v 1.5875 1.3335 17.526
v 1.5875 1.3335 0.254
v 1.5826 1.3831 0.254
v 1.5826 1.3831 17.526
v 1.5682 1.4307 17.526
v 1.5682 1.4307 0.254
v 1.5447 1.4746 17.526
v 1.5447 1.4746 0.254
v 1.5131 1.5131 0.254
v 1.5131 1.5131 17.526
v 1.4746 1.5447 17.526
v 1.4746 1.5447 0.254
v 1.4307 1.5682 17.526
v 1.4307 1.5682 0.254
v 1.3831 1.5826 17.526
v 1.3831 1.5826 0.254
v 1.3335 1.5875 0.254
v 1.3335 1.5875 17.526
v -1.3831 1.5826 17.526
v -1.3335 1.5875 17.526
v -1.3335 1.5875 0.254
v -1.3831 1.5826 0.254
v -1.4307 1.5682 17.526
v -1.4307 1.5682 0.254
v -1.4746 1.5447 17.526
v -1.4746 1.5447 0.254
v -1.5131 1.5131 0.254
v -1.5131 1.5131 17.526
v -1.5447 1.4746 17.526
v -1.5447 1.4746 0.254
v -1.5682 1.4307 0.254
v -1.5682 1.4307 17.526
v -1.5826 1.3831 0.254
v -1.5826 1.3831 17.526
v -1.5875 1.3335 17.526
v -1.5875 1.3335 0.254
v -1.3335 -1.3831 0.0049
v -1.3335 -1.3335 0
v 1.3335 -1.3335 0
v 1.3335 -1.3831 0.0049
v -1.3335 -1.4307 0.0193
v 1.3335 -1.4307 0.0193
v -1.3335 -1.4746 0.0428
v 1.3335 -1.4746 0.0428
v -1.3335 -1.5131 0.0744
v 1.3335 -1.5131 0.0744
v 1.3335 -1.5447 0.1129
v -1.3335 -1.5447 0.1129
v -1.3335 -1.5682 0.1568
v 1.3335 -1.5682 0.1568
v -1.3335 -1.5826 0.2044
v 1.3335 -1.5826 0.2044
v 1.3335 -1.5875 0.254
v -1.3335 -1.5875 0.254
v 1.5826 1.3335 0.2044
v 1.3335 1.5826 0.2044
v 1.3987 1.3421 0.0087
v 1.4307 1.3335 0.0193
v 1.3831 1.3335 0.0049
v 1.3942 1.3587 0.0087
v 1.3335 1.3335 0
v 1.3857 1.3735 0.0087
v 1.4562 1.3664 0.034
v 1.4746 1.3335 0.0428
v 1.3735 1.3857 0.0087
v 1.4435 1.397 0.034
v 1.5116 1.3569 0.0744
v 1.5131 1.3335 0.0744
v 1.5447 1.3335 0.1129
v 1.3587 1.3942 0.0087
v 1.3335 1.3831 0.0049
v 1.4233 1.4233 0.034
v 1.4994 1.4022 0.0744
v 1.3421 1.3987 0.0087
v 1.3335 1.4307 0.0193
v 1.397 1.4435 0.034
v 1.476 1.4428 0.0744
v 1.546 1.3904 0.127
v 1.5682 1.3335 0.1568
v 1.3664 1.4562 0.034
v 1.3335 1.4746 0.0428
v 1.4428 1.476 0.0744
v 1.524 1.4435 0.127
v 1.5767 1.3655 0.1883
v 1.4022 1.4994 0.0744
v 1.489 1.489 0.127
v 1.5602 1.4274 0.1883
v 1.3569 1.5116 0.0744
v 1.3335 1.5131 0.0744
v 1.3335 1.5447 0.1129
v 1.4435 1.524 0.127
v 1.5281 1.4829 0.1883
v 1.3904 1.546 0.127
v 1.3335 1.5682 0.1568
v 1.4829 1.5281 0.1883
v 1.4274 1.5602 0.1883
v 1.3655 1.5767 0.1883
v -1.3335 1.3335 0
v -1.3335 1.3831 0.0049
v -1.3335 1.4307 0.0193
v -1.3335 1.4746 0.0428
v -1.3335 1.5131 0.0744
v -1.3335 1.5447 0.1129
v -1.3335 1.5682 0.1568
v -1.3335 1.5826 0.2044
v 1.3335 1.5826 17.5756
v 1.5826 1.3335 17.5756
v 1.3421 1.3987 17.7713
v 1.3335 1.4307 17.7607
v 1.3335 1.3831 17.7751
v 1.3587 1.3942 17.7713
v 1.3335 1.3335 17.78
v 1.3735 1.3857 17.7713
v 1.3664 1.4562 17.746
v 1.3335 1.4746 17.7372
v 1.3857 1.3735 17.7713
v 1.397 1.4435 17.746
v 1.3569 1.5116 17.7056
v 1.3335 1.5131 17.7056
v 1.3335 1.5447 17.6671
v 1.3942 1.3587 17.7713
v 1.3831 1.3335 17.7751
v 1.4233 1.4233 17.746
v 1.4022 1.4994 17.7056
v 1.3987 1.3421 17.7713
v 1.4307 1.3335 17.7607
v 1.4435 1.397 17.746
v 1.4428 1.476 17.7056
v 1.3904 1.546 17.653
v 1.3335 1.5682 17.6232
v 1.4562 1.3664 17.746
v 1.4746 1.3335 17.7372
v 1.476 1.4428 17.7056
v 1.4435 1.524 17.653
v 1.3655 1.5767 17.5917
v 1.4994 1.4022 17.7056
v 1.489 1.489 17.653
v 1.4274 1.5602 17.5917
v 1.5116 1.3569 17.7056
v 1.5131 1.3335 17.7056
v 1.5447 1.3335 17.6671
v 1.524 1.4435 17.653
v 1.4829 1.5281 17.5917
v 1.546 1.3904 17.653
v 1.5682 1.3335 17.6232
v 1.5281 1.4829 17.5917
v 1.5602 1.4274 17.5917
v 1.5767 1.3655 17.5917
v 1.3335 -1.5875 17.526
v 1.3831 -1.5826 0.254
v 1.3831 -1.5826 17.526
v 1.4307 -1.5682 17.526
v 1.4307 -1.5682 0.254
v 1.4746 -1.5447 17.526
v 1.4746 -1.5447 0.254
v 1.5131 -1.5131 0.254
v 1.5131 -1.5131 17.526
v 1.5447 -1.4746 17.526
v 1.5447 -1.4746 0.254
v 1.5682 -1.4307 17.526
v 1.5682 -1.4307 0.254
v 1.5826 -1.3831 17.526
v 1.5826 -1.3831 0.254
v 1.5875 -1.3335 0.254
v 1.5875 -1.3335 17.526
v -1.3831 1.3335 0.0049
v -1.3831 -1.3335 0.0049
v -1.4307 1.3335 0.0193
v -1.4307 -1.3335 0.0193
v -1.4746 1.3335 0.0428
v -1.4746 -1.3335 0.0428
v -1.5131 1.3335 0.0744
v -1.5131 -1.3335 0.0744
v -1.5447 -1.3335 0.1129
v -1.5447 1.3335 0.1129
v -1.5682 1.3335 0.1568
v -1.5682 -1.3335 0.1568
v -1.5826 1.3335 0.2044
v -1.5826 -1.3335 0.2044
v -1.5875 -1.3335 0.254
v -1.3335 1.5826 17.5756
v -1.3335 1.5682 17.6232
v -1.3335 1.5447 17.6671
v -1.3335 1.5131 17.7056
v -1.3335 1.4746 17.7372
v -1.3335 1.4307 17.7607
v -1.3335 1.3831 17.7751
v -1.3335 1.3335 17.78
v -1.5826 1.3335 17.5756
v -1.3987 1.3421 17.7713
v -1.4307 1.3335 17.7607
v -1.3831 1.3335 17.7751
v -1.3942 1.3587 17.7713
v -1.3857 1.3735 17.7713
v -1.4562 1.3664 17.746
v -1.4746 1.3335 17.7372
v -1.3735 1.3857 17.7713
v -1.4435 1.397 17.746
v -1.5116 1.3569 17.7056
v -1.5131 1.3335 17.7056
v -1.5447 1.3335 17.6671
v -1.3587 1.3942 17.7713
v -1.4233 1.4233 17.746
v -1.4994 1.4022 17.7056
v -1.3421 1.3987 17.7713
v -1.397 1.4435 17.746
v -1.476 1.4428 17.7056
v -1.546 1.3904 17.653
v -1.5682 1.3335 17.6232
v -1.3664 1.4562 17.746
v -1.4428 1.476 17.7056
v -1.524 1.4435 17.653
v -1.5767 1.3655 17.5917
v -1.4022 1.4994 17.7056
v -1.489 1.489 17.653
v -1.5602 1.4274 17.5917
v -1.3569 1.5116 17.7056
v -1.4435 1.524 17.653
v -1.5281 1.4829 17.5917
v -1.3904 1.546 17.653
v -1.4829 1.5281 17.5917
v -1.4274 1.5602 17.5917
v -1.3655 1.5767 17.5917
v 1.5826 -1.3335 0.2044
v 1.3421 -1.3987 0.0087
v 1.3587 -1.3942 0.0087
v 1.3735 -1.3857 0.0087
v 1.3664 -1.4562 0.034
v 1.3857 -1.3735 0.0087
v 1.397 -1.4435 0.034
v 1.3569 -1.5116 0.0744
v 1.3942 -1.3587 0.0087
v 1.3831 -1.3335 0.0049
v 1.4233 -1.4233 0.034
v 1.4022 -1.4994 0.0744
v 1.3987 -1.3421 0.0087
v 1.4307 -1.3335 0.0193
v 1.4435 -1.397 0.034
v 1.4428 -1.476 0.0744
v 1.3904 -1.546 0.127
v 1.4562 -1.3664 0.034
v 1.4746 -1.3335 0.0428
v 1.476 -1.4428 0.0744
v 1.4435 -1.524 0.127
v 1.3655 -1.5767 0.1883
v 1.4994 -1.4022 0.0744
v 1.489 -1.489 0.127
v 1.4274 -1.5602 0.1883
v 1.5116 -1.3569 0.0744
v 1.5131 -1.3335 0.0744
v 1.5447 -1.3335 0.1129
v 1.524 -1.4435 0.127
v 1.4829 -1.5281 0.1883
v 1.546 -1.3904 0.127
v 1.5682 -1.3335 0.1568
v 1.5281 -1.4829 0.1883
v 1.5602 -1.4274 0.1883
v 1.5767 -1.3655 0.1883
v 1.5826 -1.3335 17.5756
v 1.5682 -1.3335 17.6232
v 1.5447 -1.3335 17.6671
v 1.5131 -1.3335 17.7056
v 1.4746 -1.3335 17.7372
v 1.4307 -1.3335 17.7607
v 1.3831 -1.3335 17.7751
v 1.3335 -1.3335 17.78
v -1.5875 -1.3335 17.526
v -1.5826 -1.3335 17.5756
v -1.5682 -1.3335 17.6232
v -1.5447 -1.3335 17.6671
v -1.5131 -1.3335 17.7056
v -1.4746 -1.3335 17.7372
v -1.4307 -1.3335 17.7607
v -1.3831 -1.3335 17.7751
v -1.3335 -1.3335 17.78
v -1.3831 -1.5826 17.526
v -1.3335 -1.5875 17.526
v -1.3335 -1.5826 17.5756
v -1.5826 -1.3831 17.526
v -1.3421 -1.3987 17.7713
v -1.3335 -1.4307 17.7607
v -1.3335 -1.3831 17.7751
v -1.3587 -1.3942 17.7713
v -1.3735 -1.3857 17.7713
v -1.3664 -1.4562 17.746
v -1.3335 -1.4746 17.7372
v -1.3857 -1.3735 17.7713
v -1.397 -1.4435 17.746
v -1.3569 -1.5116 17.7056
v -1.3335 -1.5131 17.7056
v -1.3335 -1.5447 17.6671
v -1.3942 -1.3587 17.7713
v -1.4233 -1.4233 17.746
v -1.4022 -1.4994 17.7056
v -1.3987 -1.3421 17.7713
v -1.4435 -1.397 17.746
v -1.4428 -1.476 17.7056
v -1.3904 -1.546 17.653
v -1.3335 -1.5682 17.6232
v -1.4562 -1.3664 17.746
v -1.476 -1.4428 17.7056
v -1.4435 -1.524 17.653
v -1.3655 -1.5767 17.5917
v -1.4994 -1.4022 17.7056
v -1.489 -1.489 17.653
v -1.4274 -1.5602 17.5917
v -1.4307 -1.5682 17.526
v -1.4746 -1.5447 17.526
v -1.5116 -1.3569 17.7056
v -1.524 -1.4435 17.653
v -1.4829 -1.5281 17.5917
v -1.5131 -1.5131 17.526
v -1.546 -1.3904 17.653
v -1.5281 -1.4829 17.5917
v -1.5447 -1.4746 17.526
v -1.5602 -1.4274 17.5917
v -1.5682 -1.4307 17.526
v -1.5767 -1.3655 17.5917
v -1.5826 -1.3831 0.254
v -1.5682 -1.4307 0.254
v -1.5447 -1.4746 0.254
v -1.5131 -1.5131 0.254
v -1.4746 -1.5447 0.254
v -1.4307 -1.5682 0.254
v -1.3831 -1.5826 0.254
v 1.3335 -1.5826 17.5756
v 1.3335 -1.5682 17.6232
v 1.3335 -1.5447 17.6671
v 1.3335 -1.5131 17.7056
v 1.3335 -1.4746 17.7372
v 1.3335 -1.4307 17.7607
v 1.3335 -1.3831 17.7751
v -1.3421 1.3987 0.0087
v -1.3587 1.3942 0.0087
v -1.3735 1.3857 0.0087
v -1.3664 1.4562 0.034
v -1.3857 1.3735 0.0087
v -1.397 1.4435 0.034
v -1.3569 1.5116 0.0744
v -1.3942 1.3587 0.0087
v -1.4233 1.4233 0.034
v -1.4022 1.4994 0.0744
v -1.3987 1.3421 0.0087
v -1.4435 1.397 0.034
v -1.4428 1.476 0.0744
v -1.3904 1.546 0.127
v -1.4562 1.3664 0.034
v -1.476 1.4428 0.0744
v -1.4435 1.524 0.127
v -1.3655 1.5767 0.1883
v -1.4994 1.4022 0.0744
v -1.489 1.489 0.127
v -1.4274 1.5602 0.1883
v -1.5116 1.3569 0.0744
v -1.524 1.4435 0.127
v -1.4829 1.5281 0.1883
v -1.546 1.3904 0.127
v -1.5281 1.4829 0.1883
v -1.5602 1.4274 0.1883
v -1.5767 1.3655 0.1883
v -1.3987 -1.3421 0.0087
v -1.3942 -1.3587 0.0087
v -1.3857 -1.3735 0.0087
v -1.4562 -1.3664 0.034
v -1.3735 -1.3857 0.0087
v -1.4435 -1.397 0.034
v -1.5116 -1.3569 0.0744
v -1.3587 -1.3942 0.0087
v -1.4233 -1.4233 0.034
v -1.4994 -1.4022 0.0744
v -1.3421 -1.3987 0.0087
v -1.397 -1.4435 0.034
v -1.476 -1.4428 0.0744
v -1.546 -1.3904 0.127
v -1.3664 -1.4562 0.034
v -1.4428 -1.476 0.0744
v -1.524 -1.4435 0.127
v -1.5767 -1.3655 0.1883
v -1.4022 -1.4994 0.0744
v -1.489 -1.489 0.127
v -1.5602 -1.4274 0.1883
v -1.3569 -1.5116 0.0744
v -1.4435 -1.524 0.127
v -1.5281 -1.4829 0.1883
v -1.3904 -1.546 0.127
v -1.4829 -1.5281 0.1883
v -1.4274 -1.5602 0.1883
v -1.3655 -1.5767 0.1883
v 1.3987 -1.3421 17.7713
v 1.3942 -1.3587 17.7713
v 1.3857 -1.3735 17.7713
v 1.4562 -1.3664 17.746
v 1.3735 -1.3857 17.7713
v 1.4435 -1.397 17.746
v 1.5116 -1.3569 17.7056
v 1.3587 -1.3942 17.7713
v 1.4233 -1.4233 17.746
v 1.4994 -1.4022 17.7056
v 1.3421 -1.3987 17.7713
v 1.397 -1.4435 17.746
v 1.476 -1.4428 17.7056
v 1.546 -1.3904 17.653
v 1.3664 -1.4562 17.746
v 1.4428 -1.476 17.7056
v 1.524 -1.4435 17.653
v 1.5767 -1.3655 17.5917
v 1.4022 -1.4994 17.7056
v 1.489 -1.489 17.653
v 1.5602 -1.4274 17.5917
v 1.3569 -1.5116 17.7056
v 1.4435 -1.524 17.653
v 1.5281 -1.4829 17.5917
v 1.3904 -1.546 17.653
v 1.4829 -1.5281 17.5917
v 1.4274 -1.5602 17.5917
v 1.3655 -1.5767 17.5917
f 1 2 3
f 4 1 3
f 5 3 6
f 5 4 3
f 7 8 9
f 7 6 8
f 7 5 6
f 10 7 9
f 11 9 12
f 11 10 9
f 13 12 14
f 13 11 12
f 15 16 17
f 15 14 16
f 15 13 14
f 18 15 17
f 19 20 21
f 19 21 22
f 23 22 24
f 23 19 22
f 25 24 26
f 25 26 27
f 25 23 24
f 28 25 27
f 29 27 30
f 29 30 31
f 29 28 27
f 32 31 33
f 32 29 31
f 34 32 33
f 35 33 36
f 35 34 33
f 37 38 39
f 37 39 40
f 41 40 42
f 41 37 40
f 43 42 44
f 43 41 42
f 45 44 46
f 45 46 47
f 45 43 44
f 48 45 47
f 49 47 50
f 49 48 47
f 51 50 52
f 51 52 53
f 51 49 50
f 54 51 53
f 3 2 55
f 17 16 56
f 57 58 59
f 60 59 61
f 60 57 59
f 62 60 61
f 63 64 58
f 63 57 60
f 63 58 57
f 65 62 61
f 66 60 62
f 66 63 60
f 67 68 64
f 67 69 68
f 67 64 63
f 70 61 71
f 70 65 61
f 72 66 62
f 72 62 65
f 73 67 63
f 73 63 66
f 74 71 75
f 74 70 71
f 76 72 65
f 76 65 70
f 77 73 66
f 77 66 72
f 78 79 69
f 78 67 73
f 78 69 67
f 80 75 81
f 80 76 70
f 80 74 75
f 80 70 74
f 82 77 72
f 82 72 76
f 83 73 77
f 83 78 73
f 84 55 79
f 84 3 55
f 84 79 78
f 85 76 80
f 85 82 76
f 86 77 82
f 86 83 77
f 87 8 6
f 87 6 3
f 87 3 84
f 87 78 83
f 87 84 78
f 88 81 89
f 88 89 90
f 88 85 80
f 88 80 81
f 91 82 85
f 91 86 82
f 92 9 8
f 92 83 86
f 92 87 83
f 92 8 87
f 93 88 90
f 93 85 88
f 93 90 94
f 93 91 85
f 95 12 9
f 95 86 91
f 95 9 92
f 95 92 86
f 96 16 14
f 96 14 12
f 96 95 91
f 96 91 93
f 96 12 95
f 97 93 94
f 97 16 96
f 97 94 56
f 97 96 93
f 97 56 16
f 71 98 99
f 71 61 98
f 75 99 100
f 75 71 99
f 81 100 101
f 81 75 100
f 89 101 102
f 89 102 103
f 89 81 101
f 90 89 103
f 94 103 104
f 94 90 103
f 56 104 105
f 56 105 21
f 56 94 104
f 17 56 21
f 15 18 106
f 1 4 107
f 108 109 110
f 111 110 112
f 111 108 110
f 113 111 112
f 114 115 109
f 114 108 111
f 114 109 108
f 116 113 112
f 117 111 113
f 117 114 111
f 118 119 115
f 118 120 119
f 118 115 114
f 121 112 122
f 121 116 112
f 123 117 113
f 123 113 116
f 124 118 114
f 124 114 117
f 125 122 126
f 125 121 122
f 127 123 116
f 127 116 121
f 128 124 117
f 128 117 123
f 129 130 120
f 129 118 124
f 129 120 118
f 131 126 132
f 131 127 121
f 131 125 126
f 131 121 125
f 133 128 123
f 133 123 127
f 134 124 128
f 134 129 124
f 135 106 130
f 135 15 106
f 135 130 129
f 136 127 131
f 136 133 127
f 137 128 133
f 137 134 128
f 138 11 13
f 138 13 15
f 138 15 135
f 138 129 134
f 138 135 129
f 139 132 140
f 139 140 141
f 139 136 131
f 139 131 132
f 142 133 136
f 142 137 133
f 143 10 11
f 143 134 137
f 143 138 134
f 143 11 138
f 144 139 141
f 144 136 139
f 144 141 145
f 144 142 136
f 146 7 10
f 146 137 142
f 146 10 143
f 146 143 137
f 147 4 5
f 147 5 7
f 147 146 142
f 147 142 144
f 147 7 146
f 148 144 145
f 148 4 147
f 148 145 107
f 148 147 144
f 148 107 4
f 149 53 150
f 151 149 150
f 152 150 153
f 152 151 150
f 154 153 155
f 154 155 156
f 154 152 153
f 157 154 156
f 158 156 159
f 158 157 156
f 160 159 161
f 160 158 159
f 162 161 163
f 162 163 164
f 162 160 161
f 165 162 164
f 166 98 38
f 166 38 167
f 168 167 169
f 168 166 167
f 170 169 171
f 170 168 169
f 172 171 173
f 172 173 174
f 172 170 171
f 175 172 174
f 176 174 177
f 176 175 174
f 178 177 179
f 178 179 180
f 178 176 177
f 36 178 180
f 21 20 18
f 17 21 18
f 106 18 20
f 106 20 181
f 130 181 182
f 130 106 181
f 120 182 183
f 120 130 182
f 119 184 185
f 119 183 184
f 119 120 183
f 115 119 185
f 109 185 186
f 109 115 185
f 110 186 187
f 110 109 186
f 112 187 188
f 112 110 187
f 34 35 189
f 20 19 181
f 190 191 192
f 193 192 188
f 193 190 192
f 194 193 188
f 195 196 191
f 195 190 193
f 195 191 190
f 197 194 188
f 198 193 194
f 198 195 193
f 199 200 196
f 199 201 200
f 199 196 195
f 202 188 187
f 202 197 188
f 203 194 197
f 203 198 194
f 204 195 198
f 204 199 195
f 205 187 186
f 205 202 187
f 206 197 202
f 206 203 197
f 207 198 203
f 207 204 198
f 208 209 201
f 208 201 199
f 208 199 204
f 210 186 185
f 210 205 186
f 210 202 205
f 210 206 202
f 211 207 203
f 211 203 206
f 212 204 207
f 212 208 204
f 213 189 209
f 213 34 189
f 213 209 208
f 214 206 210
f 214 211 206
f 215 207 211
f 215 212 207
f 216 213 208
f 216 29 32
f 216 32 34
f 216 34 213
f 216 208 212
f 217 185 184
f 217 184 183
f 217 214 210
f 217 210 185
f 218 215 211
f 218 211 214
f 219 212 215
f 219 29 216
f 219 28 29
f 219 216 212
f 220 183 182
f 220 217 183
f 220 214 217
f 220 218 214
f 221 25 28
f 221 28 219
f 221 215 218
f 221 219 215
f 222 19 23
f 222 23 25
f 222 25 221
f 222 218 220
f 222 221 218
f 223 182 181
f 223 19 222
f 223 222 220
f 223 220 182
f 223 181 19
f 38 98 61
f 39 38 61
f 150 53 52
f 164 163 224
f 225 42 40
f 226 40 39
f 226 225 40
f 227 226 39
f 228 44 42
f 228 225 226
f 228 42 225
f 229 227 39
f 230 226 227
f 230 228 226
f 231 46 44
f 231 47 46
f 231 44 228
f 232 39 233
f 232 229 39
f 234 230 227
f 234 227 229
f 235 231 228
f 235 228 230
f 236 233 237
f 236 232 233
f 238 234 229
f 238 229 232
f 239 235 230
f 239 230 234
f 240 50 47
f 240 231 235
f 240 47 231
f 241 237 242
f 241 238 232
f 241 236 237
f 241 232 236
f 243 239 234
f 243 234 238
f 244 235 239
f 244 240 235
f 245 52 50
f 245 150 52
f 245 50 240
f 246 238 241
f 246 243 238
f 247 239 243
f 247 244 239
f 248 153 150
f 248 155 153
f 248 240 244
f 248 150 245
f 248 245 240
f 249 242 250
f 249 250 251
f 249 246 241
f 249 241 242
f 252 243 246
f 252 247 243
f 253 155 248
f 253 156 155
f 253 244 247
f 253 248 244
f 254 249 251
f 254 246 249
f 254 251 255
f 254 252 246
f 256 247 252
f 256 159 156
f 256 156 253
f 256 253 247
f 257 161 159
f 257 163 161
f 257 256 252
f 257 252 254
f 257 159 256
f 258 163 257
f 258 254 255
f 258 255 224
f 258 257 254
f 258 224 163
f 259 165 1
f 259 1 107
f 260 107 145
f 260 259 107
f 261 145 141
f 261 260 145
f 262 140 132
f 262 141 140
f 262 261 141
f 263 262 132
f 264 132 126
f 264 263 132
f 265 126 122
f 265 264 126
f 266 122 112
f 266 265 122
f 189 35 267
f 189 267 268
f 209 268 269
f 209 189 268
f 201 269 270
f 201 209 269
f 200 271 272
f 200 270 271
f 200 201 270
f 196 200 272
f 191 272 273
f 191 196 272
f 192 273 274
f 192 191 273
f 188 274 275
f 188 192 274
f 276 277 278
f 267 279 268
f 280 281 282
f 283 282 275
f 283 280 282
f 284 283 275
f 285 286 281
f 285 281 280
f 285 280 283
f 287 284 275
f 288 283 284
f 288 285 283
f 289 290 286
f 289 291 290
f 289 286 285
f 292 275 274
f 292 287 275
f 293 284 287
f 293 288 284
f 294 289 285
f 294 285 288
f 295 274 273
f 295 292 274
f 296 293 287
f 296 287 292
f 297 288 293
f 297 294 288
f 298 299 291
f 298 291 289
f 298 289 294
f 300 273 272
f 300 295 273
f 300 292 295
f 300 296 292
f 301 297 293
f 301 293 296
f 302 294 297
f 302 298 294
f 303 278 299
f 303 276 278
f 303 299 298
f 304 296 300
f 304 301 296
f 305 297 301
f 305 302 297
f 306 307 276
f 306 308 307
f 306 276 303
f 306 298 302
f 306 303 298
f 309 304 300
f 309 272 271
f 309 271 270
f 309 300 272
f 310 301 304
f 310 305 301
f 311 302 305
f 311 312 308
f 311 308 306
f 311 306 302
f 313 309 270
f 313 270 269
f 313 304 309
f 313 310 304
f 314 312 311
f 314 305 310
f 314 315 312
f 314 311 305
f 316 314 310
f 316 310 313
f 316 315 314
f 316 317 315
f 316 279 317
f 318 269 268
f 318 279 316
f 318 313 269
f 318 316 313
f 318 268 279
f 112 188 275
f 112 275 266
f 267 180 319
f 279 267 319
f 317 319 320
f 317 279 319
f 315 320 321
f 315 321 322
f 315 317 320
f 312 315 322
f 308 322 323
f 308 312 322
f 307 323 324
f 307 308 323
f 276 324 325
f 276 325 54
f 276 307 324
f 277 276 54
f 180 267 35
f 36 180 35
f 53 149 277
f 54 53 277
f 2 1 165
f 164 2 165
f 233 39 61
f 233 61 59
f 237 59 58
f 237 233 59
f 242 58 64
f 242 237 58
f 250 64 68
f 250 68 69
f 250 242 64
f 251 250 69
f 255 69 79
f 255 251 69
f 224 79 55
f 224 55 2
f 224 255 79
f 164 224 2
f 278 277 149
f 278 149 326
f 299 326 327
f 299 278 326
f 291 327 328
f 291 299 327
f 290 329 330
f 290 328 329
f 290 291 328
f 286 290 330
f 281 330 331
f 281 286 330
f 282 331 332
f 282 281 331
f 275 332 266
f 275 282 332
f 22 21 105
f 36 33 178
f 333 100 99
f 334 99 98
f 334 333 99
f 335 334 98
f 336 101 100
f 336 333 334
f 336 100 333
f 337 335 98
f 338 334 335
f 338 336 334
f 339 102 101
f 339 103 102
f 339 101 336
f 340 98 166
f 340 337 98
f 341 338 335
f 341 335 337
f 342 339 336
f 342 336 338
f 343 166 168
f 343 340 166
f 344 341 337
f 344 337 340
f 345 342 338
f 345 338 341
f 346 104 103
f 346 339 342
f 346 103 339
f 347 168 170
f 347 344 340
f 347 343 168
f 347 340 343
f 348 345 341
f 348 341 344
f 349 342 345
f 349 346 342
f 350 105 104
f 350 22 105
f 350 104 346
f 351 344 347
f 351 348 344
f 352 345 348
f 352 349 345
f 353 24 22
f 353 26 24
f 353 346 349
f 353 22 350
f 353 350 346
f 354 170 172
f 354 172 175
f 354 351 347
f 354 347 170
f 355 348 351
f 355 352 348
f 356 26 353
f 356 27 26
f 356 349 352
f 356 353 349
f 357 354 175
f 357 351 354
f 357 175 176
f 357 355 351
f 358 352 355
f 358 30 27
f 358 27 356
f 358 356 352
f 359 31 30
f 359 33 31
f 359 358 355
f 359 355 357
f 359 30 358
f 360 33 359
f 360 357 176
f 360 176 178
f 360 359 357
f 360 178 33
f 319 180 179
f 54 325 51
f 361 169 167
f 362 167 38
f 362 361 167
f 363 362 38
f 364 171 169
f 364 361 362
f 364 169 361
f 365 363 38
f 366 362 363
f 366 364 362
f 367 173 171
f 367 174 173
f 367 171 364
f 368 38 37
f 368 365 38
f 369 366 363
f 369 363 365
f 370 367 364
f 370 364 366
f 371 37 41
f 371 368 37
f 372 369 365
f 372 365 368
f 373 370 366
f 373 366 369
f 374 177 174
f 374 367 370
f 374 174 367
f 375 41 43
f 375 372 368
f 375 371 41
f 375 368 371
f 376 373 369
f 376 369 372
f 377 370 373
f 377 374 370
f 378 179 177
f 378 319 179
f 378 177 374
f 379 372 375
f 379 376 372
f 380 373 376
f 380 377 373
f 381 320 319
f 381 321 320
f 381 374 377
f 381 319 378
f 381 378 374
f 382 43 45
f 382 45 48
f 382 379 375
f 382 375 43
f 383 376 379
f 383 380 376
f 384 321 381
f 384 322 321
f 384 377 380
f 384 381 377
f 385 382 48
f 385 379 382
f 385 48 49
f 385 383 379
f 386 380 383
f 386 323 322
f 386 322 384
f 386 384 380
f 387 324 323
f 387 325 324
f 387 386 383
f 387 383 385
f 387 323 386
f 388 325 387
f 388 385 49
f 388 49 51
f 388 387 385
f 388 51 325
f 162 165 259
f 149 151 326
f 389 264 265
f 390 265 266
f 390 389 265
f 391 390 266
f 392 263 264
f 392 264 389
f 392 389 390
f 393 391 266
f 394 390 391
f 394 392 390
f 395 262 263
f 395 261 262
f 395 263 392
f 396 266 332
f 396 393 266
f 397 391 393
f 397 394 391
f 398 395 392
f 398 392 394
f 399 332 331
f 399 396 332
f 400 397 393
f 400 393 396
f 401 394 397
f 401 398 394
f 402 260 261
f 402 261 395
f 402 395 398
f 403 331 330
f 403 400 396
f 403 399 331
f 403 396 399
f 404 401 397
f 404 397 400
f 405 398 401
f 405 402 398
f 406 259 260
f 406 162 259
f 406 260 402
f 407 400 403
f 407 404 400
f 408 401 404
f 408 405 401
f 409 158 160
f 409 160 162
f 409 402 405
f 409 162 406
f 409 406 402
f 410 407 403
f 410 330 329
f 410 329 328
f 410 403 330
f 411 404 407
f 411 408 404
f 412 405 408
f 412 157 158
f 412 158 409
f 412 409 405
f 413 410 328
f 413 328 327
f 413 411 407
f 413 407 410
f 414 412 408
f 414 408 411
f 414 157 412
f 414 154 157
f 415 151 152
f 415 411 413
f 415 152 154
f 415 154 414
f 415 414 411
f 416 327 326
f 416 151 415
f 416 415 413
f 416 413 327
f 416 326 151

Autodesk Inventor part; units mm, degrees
ref_plane "YZ Plane" through (0, 0, 0) normal (1, 0, 0) x (0, 1, 0)
ref_plane "XZ Plane" through (0, 0, 0) normal (0, 1, 0) x (-1, 0, 0)
ref_plane "XY Plane" through (0, 0, 0) normal (0, 0, 1) x (1, 0, 0)
sketch "Sketch1" plane through (0, 0, 0) normal (0, 0, 1) x (1, 0, 0)
  line L0 (-1.5875, 1.5875) -> (1.5875, 1.5875)
  line L1 (1.5875, 1.5875) -> (1.5875, -1.5875)
  line L2 (1.5875, -1.5875) -> (-1.5875, -1.5875)
  line L3 (-1.5875, -1.5875) -> (-1.5875, 1.5875)
  point P0 (0, 0)
  dimension "d0" = 3.175
  dimension "d1" = 3.175
  dimension "d2" = 1.5875
  dimension "d3" = 1.5875
extrude "Extrusion1" add sketch "Sketch1" along normal blind 17.78
fillet "Fillet1" radius 0.254 12 edges at (1.5875, 1.5875, 8.89) (-1.5875, 1.5875, 8.89) (-1.5875, -1.5875, 8.89) (1.5875, -1.5875, 8.89) (0, -1.5875, 17.78) (1.5875, 0, 17.78) (0, 1.5875, 17.78) (-1.5875, 0, 17.78) (0, 1.5875, 0) (-1.5875, 0, 0) (0, -1.5875, 0) (1.5875, 0, 0)
equation "\"d1\" = d0"
equation "\"d2\" = 0.5 * d1"
equation "\"d3\" = 0.5 * d0"
properties part number "wheel_key" material "Steel, High Strength Low Alloy"
